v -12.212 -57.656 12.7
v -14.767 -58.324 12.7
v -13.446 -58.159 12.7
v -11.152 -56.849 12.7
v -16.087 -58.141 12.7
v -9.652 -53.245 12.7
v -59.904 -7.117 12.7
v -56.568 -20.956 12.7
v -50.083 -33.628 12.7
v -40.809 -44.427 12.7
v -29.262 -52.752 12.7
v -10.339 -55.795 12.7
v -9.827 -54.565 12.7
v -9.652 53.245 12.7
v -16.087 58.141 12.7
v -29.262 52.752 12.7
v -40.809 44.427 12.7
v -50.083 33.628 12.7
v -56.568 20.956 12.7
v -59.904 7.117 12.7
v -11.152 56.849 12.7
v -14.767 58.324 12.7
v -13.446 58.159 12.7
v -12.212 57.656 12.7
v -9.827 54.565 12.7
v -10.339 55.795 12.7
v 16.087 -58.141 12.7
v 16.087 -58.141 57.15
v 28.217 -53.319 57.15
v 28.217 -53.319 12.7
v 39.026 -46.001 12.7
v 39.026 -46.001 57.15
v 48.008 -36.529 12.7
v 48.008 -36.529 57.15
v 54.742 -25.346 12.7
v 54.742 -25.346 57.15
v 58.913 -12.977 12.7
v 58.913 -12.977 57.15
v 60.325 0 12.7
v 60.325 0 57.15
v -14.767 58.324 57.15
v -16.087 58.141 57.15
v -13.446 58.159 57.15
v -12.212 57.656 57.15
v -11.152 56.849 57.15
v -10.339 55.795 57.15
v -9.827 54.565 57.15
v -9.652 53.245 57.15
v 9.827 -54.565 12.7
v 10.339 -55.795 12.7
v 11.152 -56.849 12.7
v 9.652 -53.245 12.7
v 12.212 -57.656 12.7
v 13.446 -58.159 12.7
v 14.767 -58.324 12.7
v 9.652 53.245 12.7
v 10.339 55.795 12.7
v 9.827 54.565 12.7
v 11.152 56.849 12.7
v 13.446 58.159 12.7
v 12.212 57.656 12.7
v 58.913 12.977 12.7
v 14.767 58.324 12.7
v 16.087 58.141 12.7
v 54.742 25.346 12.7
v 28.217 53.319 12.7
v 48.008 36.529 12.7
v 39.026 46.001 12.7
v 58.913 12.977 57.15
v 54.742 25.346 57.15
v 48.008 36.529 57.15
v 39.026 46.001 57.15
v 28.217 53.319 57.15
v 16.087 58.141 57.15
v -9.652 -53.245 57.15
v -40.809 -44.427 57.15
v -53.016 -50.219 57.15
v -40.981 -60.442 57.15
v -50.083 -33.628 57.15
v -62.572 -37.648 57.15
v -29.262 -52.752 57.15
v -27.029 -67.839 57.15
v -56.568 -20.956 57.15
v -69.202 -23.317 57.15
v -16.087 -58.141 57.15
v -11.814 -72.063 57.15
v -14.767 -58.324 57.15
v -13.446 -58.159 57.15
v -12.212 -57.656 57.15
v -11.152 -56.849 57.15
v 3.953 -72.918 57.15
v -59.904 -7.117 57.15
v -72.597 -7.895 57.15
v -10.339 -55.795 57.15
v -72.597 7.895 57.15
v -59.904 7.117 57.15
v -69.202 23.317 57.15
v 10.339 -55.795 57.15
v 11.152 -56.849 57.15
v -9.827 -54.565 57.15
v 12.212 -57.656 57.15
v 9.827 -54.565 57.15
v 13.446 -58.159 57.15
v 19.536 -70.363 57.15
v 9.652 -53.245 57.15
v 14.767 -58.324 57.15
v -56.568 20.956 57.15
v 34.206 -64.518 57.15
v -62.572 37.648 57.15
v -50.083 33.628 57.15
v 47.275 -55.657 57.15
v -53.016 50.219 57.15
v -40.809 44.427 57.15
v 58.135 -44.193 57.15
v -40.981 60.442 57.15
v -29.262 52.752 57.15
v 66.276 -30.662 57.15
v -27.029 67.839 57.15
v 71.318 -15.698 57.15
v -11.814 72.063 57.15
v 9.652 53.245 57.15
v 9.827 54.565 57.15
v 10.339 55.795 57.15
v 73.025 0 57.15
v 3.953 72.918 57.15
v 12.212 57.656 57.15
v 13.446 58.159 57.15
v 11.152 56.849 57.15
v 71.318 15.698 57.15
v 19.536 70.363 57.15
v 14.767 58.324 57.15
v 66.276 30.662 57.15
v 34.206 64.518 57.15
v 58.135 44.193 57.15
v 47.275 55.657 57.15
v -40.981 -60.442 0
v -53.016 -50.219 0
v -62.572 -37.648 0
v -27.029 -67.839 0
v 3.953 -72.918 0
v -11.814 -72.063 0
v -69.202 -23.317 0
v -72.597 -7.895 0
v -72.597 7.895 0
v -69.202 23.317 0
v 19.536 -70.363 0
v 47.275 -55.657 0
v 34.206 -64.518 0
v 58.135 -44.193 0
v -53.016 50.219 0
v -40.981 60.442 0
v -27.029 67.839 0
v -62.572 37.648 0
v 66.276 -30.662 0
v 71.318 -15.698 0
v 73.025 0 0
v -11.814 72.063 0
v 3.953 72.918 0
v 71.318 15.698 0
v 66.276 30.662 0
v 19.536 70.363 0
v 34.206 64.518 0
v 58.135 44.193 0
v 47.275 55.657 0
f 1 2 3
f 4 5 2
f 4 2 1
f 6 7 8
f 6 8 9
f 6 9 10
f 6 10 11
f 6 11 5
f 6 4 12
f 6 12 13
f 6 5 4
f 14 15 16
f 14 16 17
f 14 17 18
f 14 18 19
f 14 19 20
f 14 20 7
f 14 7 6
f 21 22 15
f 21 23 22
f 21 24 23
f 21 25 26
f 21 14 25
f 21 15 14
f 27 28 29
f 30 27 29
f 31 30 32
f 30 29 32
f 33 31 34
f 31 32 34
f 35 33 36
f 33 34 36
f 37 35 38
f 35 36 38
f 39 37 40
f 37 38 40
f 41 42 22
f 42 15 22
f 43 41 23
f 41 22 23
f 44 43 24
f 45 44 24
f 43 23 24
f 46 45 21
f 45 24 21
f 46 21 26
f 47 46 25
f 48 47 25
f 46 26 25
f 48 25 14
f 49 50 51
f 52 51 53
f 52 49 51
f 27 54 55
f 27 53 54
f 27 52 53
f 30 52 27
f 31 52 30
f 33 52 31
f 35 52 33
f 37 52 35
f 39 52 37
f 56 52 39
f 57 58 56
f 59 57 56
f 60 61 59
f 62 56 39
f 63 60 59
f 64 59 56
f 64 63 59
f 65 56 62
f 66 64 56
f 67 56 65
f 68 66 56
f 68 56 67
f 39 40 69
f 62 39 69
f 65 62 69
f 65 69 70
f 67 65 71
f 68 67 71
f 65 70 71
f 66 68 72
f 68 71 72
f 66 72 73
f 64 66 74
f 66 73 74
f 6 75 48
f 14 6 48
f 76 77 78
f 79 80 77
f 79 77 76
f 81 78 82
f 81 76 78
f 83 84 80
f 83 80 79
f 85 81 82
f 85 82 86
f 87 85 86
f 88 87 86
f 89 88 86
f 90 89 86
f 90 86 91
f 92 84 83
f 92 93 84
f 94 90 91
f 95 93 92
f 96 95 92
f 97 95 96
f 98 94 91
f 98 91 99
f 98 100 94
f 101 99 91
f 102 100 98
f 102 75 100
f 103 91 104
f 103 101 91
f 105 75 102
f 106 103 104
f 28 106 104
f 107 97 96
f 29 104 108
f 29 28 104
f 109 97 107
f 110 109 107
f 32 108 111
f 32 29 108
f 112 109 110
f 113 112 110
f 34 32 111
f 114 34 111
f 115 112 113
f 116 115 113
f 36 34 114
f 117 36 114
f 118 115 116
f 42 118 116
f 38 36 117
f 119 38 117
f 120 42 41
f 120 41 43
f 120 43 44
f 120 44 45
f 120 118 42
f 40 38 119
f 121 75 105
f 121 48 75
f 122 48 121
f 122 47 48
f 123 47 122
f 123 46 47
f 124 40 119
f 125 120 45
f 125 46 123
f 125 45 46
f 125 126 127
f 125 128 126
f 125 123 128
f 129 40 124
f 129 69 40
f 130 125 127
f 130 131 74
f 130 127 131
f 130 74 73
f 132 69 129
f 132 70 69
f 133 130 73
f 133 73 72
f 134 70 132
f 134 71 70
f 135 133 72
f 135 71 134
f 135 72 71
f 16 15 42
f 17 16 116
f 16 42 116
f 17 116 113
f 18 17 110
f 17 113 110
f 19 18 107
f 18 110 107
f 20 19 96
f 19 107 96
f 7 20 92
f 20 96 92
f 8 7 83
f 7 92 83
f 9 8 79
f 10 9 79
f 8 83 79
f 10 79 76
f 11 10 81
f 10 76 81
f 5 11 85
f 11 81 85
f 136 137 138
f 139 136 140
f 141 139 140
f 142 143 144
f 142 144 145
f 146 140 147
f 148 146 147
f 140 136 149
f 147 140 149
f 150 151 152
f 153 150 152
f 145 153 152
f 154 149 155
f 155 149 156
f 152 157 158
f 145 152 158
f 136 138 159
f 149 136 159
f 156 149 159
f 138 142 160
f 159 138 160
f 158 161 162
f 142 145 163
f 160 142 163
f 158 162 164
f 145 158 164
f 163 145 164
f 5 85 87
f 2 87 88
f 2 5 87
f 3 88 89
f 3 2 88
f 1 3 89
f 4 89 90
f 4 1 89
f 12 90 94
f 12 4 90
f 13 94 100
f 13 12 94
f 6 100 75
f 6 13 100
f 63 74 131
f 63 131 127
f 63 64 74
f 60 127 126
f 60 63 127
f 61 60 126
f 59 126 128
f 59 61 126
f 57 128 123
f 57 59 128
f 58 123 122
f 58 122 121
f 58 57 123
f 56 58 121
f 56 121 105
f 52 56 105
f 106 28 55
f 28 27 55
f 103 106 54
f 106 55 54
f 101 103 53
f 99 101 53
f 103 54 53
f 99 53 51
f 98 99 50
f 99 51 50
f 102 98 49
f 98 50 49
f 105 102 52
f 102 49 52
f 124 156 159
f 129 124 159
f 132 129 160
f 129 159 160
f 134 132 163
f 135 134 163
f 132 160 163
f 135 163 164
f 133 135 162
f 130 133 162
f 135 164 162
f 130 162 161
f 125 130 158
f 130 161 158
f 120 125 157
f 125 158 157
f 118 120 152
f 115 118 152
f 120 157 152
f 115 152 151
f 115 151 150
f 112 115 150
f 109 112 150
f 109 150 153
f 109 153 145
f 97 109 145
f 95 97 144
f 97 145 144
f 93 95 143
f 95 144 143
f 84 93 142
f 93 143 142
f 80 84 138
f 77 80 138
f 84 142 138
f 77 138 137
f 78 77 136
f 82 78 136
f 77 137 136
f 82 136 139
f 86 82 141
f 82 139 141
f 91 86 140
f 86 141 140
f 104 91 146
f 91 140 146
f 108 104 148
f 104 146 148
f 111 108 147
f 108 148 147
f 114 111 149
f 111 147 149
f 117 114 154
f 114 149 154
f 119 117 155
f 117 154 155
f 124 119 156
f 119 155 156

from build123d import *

# Parameters (mm, degrees)
F0_R     = 73.025
F1_DEPTH = 57.15
F3_DEPTH = 44.45
F4_R     = 5.08
F5_R     = 5.08


with BuildPart() as f1:
    # F0 (on Top) → F1 (new body)
    with BuildSketch(Plane.XY):
        Circle(F0_R)
    extrude(amount=F1_DEPTH)

    # F2 (on face) → F3 (cut)
    with BuildSketch(Plane.XY.offset(57.15)):
        with BuildLine():
            Line((-9.652, 0), (-9.652, 59.5478338901))
            ThreePointArc((-9.652, 59.5478338901), (-60.325, 0), (-9.652, -59.5478338901))
            Line((-9.652, -59.5478338901), (-9.652, 0))
        make_face()
        with BuildLine():
            ThreePointArc((9.652, -59.5478338901), (45.9421512611, -39.0950682631), (60.325, 0))
            ThreePointArc((60.325, 0), (45.9421512611, 39.0950682631), (9.652, 59.5478338901))
            Line((9.652, 59.5478338901), (9.652, 0))
            Line((9.652, 0), (9.652, -59.5478338901))
        make_face()
    extrude(amount=-F3_DEPTH, mode=Mode.SUBTRACT)

    # F4
    f4_edges = [f1.edges().sort_by_distance(p)[0] for p in [
        (-9.652, 59.547834, 34.925),
    ]]
    fillet(f4_edges, radius=F4_R)

    # F5
    f5_edges = [f1.edges().sort_by_distance(p)[0] for p in [
        (9.652, 59.547834, 34.925),
        (9.652, -59.547834, 34.925),
        (-9.652, -59.547834, 34.925),
    ]]
    fillet(f5_edges, radius=F5_R)


solid = f1.part
